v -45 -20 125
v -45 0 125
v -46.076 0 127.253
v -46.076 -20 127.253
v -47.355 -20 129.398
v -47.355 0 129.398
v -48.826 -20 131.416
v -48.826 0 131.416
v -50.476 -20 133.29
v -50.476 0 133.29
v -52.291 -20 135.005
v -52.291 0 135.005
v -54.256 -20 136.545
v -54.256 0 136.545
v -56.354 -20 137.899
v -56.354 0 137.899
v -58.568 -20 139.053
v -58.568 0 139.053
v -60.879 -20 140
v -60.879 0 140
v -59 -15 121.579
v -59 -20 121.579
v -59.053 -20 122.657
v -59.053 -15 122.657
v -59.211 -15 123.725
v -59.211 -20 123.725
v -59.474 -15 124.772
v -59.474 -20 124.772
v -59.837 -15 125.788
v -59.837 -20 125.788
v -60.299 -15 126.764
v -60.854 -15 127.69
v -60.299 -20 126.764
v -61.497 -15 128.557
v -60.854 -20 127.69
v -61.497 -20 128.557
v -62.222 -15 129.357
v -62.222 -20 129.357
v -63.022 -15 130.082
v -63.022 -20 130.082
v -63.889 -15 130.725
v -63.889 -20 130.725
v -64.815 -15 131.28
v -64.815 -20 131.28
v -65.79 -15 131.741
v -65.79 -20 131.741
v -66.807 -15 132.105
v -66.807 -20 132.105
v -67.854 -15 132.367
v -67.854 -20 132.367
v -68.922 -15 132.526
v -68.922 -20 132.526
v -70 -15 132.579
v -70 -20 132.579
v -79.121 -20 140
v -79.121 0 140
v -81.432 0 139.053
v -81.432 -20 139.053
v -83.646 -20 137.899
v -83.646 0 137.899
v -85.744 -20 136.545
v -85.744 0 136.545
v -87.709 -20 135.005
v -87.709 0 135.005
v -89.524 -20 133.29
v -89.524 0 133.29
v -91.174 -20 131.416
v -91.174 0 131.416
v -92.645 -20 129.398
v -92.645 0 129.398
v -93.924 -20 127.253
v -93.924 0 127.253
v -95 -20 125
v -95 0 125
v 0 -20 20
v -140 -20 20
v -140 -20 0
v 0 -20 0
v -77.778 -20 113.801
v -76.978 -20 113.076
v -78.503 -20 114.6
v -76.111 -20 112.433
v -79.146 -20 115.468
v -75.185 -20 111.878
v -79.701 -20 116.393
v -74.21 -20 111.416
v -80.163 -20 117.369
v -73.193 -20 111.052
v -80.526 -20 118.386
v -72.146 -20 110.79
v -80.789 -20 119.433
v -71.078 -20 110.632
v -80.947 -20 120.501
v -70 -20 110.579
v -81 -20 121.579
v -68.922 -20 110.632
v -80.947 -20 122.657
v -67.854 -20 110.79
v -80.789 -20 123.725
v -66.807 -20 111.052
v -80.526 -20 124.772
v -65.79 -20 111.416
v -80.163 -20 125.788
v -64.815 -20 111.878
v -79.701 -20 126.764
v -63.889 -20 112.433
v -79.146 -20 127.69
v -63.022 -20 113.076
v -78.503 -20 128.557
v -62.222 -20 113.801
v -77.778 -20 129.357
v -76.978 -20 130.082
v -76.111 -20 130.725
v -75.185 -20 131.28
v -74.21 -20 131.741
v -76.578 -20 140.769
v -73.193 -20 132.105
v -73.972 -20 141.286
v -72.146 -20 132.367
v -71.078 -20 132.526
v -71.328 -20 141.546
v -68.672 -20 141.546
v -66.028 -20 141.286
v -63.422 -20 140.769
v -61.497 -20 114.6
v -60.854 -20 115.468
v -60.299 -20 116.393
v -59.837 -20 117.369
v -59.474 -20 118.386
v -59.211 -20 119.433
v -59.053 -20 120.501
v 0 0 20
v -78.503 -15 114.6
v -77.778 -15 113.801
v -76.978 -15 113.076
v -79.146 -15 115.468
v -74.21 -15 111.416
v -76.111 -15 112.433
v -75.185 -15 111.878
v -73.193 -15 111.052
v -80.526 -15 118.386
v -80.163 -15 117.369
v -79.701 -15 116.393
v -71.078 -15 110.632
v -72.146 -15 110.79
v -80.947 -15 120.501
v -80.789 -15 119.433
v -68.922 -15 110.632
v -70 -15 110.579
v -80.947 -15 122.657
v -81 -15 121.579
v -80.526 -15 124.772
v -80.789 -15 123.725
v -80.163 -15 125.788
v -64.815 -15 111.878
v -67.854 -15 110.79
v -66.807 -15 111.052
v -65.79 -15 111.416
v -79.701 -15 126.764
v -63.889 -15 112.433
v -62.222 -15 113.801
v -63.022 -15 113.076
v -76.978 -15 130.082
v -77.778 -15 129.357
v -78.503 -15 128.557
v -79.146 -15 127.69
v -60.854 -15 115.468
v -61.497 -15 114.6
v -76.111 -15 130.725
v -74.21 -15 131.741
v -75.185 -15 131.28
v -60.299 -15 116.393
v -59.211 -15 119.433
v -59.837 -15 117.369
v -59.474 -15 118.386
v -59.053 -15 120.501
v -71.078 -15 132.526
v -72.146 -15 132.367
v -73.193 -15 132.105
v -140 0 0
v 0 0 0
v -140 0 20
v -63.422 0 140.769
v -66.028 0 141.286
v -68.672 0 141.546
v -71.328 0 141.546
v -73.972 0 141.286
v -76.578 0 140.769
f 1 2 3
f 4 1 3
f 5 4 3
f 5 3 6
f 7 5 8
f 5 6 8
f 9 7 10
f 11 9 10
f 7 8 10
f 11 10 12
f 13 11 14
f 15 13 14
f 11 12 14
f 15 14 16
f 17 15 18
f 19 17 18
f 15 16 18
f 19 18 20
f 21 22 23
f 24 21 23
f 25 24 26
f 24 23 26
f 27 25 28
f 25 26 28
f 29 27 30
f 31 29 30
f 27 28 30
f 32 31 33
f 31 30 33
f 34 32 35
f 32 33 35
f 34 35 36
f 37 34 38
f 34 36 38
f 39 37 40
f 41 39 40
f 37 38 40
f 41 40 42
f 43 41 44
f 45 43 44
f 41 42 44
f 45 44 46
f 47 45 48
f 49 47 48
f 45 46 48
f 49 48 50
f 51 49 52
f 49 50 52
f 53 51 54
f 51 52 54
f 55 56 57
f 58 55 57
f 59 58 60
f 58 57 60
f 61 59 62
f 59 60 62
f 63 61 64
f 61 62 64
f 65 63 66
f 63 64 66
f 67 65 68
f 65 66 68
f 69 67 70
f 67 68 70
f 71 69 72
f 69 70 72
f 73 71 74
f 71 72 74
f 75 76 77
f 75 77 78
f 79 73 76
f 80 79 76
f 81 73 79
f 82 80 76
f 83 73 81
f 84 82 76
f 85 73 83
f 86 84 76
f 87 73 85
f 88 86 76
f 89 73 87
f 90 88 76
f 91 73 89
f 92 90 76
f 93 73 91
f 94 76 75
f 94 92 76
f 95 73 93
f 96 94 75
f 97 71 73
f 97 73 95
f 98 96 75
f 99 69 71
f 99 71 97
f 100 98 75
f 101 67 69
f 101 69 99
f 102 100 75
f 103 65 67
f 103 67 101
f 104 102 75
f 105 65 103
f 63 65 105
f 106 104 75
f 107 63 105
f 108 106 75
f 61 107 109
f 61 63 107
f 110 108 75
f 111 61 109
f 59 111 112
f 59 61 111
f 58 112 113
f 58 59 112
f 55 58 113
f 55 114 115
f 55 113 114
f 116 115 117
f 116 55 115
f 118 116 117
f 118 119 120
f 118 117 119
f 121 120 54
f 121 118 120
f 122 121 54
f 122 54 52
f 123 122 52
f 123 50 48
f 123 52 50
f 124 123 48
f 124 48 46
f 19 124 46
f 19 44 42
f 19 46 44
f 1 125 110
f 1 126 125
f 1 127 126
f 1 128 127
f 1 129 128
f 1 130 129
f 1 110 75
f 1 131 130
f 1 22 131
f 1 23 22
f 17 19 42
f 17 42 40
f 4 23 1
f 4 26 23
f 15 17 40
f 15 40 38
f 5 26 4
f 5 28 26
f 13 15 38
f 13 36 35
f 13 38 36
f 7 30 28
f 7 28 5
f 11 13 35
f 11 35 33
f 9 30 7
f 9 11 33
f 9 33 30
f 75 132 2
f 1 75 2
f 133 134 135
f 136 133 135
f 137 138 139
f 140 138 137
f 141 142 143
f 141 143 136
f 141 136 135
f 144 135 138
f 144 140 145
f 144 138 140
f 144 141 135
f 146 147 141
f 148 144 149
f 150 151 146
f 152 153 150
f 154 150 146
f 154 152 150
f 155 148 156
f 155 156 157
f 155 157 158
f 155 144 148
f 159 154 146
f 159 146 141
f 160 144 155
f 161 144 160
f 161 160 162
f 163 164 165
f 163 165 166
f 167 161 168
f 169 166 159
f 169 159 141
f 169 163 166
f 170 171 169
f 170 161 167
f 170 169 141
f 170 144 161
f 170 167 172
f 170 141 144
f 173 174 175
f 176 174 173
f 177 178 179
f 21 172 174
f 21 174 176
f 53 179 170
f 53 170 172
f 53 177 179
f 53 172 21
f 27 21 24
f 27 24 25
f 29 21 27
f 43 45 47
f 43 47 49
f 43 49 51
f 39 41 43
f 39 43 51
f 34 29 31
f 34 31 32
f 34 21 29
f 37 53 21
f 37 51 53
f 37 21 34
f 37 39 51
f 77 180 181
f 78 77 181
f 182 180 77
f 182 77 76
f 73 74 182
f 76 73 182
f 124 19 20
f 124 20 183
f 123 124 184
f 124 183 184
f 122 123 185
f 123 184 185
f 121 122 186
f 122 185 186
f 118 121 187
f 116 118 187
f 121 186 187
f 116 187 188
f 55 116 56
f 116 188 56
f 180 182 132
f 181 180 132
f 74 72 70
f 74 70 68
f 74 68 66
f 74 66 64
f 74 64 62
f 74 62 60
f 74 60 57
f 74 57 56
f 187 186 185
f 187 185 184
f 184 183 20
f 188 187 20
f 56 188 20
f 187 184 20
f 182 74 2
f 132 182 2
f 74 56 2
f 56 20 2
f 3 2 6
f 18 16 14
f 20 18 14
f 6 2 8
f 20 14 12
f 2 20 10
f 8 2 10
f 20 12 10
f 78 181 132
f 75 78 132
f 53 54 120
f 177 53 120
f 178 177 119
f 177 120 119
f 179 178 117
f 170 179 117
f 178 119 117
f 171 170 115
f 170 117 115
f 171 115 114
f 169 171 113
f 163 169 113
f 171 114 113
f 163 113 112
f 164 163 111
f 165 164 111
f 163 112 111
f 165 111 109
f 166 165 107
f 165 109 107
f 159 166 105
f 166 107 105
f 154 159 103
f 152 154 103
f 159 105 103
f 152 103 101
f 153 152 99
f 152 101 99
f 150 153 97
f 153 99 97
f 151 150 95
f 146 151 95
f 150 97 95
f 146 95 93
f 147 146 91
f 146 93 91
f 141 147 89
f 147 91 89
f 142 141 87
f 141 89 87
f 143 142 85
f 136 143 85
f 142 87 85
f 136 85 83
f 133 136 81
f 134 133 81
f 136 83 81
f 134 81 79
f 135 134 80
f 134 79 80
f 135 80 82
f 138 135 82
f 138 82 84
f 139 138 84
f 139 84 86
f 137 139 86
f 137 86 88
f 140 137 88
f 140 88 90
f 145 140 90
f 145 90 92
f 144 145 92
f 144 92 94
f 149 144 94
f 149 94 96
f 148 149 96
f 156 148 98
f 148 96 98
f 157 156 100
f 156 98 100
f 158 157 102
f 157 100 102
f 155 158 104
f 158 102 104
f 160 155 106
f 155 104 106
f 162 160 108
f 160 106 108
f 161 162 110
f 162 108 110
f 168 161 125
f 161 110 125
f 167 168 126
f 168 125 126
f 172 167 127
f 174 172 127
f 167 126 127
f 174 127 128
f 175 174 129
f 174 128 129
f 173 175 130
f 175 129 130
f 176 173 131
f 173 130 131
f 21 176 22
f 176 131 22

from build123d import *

# Parameters (mm, degrees)
F0_W     = 140
F0_H     = 20
F1_DEPTH = 20
F3_DEPTH = 5


with BuildPart() as f1:
    # F0 (on Front) → F1 (new body)
    with BuildSketch(Plane.XZ):
        with BuildLine():
            ThreePointArc((-60.8786071337, 140), (-70, 141.578780142), (-79.1213928663, 140))
            Line((-79.1213928663, 140), (-60.8786071337, 140))
        make_face()
        with Locations((-70, 10)):
            Rectangle(F0_W, F0_H)
        with BuildLine():
            Line((-60.8786071337, 140), (-79.1213928663, 140))
            ThreePointArc((-79.1213928663, 140), (-88.6364525268, 134.16805413), (-95, 125))
            ThreePointArc((-95, 125), (-75.3872103911, 87.8412774691), (-42.8612134521, 114.439993594))
            ThreePointArc((-42.8612134521, 114.439993594), (-43.401283875, 119.8272039851), (-45, 125))
            ThreePointArc((-45, 125), (-51.3635474732, 134.16805413), (-60.8786071337, 140))
        make_face()
        with BuildLine():
            Line((-95, 125), (-140, 20))
            Line((-140, 20), (0, 20))
            Line((0, 20), (-45, 125))
            ThreePointArc((-45, 125), (-43.401283875, 119.8272039851), (-42.8612134521, 114.439993594))
            ThreePointArc((-42.8612134521, 114.439993594), (-75.3872103911, 87.8412774691), (-95, 125))
        make_face()
    extrude(amount=F1_DEPTH)

    # F2 (on face) → F3 (cut)
    with BuildSketch(Plane.XZ.offset(20)):
        with BuildLine():
            ThreePointArc((-70, 132.578780142), (-77.7781745931, 113.8006055489), (-59, 121.578780142))
            ThreePointArc((-59, 121.578780142), (-62.2218254069, 129.356954735), (-70, 132.578780142))
        make_face()
    extrude(amount=-F3_DEPTH, mode=Mode.SUBTRACT)


solid = f1.part
